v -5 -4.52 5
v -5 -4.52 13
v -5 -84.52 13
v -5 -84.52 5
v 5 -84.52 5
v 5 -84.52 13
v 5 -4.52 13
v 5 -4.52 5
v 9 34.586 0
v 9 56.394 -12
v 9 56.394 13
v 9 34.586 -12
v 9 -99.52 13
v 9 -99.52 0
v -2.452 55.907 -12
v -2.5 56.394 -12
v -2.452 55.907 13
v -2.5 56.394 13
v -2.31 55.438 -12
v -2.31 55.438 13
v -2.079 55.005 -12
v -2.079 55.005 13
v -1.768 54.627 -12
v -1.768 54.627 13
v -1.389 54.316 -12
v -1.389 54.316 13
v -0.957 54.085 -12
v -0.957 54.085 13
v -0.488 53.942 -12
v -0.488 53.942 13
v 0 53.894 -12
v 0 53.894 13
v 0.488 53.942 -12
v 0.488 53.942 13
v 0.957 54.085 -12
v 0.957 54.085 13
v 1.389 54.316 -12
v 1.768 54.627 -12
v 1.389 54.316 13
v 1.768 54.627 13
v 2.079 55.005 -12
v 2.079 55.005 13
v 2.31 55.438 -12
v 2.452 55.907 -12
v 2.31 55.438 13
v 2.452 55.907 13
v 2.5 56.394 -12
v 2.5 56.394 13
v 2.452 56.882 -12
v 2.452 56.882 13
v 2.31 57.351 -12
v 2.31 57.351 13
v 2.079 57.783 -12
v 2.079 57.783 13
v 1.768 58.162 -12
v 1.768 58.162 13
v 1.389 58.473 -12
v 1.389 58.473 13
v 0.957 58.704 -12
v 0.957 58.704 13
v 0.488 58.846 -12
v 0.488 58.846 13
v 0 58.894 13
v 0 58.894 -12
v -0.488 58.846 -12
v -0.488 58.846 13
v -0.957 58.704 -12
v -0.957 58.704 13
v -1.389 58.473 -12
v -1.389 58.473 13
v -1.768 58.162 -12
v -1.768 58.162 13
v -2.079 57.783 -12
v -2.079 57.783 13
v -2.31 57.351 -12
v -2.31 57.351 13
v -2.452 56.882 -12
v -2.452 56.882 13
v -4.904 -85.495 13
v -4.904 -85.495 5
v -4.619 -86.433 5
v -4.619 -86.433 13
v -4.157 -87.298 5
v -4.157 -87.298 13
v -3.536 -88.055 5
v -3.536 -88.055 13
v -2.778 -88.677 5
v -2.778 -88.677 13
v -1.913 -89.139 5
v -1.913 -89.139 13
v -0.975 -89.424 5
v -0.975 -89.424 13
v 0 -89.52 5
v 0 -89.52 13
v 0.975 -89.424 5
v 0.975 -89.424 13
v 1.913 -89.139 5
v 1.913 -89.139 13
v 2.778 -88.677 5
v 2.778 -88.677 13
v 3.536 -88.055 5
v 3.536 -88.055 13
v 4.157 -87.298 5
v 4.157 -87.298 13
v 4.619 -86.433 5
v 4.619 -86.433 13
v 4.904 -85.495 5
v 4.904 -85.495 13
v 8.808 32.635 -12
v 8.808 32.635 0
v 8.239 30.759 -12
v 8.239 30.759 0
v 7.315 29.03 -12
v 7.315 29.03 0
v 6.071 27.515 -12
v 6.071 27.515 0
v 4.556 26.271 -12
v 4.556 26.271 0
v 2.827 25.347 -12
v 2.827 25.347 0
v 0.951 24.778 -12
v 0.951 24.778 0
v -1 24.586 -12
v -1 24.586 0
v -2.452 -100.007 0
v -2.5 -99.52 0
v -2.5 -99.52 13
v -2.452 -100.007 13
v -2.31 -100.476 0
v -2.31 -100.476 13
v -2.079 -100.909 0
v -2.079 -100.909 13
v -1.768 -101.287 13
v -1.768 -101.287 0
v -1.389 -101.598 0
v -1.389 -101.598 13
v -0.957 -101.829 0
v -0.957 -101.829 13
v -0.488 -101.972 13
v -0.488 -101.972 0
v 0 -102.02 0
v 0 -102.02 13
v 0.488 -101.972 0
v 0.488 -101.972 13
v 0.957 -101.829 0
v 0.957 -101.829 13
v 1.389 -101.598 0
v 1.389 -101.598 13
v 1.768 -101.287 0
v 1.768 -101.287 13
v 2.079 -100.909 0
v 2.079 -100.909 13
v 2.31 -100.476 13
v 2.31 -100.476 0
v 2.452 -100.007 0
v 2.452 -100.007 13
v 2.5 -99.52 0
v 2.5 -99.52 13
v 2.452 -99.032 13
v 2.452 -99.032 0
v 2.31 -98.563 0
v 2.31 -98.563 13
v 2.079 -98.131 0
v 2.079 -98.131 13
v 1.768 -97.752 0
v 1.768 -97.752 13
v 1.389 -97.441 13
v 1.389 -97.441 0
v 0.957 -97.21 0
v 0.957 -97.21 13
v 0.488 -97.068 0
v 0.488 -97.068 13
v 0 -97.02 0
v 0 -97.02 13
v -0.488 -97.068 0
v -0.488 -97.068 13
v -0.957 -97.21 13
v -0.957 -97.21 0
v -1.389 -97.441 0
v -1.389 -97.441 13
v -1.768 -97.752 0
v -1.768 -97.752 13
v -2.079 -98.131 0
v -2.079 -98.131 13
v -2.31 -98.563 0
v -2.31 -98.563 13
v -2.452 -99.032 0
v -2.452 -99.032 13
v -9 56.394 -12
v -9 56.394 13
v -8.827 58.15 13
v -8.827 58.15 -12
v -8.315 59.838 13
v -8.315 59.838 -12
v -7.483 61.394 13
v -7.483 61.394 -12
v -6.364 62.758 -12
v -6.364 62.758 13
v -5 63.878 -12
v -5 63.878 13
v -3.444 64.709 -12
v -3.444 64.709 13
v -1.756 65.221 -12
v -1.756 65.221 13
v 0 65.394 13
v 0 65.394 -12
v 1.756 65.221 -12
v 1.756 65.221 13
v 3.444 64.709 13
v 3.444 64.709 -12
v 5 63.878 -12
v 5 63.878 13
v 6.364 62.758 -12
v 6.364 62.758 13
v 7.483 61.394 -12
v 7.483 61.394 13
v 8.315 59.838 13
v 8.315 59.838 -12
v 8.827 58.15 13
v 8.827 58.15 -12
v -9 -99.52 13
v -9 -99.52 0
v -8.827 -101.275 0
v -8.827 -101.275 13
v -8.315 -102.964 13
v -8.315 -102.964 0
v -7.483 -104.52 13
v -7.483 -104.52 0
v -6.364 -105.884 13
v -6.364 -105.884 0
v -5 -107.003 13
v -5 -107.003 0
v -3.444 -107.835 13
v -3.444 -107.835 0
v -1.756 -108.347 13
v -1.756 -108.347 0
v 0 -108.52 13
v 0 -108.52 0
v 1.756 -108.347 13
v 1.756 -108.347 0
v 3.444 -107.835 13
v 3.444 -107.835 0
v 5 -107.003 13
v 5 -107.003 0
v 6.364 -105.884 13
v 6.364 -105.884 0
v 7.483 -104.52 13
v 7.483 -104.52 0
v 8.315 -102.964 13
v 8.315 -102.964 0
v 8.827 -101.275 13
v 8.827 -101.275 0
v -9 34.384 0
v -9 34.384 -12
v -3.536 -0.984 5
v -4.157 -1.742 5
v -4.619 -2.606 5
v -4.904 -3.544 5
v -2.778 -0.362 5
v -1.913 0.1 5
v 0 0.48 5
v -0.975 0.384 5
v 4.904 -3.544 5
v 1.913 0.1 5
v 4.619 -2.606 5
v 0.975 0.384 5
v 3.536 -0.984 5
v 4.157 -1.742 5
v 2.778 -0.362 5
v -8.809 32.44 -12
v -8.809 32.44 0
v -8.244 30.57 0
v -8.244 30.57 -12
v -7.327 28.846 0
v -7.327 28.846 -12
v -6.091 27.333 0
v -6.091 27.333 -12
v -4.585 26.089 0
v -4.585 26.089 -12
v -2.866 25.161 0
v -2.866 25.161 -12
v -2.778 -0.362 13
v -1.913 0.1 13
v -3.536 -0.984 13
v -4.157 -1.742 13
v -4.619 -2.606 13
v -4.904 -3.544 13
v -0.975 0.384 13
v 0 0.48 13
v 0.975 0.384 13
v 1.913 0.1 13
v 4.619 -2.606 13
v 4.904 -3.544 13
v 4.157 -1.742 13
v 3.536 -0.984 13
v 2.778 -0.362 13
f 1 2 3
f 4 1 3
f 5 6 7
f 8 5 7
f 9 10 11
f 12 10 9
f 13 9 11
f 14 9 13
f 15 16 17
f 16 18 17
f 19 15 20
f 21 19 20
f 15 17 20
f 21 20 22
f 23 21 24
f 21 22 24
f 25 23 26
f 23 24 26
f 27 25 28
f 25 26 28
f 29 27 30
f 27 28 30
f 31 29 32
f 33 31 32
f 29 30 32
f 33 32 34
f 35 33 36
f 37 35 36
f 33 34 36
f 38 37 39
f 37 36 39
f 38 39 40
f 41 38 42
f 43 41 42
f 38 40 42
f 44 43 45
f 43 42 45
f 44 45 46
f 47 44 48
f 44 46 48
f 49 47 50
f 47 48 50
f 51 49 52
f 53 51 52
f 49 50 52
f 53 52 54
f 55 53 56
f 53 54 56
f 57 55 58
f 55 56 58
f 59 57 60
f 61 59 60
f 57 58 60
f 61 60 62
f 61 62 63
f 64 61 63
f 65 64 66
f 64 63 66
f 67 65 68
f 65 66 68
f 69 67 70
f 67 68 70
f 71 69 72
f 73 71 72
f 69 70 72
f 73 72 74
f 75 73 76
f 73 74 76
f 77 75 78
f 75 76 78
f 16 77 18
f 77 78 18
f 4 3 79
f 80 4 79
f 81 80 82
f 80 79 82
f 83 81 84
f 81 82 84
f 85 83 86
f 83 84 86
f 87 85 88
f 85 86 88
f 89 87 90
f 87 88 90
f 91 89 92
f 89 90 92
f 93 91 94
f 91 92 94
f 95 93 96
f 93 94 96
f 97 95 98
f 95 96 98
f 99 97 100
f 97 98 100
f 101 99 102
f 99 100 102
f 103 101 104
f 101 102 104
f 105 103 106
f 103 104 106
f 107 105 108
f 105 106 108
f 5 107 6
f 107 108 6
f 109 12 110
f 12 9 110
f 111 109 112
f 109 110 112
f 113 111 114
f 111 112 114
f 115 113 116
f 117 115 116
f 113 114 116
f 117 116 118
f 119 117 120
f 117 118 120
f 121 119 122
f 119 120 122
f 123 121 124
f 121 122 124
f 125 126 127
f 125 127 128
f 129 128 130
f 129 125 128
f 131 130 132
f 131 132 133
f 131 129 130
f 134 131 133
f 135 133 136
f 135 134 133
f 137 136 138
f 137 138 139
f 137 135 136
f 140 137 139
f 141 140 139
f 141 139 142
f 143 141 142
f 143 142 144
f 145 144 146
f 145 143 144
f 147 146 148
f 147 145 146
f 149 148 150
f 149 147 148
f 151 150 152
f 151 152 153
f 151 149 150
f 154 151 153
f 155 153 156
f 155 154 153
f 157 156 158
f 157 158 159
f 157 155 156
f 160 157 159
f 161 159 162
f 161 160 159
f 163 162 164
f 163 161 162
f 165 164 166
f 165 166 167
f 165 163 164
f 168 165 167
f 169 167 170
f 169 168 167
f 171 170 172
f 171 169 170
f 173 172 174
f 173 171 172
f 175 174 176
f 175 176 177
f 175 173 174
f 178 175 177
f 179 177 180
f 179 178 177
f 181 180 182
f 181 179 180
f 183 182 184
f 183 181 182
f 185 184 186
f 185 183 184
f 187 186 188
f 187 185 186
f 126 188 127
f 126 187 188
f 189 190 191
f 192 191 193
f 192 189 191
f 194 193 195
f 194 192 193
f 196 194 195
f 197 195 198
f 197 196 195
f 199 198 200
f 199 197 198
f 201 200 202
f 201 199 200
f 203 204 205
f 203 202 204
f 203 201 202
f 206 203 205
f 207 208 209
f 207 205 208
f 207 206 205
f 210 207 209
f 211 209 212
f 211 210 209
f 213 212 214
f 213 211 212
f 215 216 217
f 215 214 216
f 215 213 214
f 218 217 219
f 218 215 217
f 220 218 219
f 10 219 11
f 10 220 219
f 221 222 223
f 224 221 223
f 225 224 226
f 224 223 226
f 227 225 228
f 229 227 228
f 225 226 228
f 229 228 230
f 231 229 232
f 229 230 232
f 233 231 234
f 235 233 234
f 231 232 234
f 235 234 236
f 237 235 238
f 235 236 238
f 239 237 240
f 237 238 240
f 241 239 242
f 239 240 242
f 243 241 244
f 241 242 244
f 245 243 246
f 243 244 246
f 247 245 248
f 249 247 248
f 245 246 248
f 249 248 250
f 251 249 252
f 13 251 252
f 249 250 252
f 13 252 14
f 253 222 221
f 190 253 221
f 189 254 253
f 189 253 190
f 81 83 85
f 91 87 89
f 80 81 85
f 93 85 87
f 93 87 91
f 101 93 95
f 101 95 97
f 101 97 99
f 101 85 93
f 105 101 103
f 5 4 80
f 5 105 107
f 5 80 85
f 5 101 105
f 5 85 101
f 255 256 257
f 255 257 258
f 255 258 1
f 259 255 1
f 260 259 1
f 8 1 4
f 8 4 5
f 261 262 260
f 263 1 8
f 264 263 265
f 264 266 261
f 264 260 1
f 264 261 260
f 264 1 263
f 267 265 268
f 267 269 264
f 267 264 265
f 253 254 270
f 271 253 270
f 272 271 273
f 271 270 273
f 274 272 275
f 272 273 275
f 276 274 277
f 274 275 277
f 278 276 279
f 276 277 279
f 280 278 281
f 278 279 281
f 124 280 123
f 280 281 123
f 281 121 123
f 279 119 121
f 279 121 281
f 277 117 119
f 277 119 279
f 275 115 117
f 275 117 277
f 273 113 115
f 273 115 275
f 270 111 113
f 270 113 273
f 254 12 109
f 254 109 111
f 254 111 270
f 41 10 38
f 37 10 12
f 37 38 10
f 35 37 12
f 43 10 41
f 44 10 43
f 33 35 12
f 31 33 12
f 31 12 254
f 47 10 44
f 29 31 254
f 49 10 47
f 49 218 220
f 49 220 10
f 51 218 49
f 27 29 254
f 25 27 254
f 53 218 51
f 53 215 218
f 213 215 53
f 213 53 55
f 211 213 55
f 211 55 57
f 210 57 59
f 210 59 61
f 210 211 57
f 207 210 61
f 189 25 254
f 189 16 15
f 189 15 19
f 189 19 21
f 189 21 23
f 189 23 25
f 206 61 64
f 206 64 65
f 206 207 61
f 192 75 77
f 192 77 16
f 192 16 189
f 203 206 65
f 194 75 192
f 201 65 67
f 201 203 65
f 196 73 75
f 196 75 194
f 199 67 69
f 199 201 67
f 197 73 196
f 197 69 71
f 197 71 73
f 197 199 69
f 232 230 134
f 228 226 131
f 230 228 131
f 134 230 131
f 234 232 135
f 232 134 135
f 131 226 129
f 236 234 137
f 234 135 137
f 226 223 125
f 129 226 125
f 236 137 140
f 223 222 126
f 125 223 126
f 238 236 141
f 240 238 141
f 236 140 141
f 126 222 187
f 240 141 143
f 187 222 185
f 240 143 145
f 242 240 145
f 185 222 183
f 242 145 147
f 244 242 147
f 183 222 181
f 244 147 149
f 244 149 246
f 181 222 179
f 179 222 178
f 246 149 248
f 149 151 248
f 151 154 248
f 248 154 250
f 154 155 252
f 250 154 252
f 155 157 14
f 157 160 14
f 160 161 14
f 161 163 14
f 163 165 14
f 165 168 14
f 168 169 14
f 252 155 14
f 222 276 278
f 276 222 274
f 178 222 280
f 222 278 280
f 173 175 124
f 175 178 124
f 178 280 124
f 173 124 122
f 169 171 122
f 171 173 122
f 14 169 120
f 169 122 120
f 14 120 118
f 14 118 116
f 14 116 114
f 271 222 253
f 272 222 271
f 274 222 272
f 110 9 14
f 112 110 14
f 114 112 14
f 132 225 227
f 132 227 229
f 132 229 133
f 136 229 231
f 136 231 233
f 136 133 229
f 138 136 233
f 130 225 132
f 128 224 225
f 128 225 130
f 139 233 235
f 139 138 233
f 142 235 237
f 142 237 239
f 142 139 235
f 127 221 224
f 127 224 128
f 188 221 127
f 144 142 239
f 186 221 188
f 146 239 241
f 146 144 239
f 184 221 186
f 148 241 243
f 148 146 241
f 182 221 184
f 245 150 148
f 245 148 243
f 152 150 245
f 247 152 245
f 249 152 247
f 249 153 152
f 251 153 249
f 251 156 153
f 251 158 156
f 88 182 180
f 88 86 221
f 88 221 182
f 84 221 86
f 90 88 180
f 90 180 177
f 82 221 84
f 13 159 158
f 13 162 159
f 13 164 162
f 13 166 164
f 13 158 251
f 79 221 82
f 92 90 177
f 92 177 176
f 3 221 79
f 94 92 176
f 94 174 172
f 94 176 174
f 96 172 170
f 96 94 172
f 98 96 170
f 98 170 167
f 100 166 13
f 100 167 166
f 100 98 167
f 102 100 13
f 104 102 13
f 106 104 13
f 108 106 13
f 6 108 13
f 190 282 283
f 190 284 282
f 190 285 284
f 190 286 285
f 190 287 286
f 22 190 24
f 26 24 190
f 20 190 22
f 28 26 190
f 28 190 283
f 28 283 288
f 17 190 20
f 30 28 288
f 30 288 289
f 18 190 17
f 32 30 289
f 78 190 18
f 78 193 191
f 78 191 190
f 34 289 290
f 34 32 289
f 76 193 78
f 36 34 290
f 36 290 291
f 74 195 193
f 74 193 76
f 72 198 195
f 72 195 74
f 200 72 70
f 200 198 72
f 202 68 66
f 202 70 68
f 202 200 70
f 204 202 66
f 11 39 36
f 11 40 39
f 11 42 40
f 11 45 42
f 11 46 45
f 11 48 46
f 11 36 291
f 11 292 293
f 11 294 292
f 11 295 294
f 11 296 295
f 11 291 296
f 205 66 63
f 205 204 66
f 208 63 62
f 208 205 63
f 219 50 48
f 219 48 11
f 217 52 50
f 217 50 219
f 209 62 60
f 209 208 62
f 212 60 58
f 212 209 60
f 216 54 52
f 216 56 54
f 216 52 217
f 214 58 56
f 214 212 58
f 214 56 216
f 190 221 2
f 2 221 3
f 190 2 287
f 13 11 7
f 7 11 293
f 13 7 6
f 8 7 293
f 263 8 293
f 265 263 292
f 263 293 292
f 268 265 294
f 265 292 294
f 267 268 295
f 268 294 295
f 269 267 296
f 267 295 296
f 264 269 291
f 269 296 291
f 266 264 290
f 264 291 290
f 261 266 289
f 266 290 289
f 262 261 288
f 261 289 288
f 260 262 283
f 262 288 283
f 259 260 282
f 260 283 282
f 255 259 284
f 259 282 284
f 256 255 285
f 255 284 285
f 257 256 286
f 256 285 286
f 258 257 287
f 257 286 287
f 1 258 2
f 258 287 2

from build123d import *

# Parameters (mm, degrees)
SKETCH1_R      = 2.5
EXTRUDE1_DEPTH = 13
EXTRUDE2_DEPTH = 8
EXTRUDE3_START = 12
EXTRUDE3_DEPTH = 12
FILLET1_R      = 10
FILLET2_R      = 10
SKETCH4_R      = 2.5
EXTRUDE4_DEPTH = 112.725198761


with BuildPart() as part:
    # Sketch1 → Extrude1 (new body)
    with BuildSketch(Plane.XY):
        with BuildLine():
            Line((-9, 56.394324189), (-9, -99.519675811))
            ThreePointArc((-9, -99.519675811), (0, -108.519675811), (9, -99.519675811))
            Line((9, -99.519675811), (9, 56.394324189))
            ThreePointArc((9, 56.394324189), (0, 65.394324189), (-9, 56.394324189))
        make_face()
        with Locations(Location((0, 56.394324189, 0), (0, 0, 180))):
            Circle(SKETCH1_R, mode=Mode.SUBTRACT)
        with Locations(Location((0, -99.519675811, 0), (0, 0, 180))):
            Circle(SKETCH1_R, mode=Mode.SUBTRACT)
    extrude(amount=EXTRUDE1_DEPTH)

    # Sketch2 → Extrude2 (cut)
    with BuildSketch(Plane.XY.offset(13)):
        with BuildLine():
            Line((-5, -4.519675811), (-5, -84.519675811))
            ThreePointArc((-5, -84.519675811), (0, -89.519675811), (5, -84.519675811))
            Line((5, -84.519675811), (5, -4.519675811))
            ThreePointArc((5, -4.519675811), (0, 0.480324189), (-5, -4.519675811))
        make_face()
    extrude(amount=-EXTRUDE2_DEPTH, mode=Mode.SUBTRACT)

    # Sketch3 → Extrude3 (add)
    with BuildSketch(Plane(origin=(0, 0, 0), x_dir=(-1, 0, 0), z_dir=(0, 0, -1)).offset(EXTRUDE3_START)):
        with BuildLine():
            Line((-9, 56.394324189), (-9, 24.585637313))
            Line((-9, 24.585637313), (9, 24.585637313))
            Line((9, 24.585637313), (9, 56.394324189))
            ThreePointArc((9, 56.394324189), (0, 65.394324189), (-9, 56.394324189))
        make_face()
    extrude(amount=-EXTRUDE3_DEPTH)

    # Fillet1
    fillet1_edges = [part.edges().sort_by_distance(p)[0] for p in [
        (9, 24.585637313, -6),
    ]]
    fillet(fillet1_edges, radius=FILLET1_R)

    # Fillet2
    # the kernel refuses this fillet: 10 mm, written as the material it takes off along each edge
    with BuildSketch(Plane(origin=(-9, 24.585637313, -36.494897428), x_dir=(0, 1, 0), z_dir=(0, 0, 1))) as fillet2_piece_1:
        with BuildLine():
            CenterArc((9.797958971, -10), FILLET2_R, 90, 78.463040967)
            Line((0, -8), (-0.195959179, -7.96))
            ThreePointArc((-0.195959179, -7.96), (-0.2, -4), (-0.2, 0))
            Line((-0.2, 0), (0, 0.2))
            Line((0, 0.2), (9.797958971, 0.2))
            Line((9.797958971, 0.2), (9.797958971, 0))
        make_face()
    extrude(amount=36.494897428, mode=Mode.SUBTRACT)

    # Sketch4 → Extrude4 (cut, through all)
    with BuildSketch(Plane.XY.offset(13)):
        with Locations(Location((0, 56.394324189, 0), (0, 0, 180))):
            Circle(SKETCH4_R)
    extrude(amount=-EXTRUDE4_DEPTH, mode=Mode.SUBTRACT)


solid = part.part
